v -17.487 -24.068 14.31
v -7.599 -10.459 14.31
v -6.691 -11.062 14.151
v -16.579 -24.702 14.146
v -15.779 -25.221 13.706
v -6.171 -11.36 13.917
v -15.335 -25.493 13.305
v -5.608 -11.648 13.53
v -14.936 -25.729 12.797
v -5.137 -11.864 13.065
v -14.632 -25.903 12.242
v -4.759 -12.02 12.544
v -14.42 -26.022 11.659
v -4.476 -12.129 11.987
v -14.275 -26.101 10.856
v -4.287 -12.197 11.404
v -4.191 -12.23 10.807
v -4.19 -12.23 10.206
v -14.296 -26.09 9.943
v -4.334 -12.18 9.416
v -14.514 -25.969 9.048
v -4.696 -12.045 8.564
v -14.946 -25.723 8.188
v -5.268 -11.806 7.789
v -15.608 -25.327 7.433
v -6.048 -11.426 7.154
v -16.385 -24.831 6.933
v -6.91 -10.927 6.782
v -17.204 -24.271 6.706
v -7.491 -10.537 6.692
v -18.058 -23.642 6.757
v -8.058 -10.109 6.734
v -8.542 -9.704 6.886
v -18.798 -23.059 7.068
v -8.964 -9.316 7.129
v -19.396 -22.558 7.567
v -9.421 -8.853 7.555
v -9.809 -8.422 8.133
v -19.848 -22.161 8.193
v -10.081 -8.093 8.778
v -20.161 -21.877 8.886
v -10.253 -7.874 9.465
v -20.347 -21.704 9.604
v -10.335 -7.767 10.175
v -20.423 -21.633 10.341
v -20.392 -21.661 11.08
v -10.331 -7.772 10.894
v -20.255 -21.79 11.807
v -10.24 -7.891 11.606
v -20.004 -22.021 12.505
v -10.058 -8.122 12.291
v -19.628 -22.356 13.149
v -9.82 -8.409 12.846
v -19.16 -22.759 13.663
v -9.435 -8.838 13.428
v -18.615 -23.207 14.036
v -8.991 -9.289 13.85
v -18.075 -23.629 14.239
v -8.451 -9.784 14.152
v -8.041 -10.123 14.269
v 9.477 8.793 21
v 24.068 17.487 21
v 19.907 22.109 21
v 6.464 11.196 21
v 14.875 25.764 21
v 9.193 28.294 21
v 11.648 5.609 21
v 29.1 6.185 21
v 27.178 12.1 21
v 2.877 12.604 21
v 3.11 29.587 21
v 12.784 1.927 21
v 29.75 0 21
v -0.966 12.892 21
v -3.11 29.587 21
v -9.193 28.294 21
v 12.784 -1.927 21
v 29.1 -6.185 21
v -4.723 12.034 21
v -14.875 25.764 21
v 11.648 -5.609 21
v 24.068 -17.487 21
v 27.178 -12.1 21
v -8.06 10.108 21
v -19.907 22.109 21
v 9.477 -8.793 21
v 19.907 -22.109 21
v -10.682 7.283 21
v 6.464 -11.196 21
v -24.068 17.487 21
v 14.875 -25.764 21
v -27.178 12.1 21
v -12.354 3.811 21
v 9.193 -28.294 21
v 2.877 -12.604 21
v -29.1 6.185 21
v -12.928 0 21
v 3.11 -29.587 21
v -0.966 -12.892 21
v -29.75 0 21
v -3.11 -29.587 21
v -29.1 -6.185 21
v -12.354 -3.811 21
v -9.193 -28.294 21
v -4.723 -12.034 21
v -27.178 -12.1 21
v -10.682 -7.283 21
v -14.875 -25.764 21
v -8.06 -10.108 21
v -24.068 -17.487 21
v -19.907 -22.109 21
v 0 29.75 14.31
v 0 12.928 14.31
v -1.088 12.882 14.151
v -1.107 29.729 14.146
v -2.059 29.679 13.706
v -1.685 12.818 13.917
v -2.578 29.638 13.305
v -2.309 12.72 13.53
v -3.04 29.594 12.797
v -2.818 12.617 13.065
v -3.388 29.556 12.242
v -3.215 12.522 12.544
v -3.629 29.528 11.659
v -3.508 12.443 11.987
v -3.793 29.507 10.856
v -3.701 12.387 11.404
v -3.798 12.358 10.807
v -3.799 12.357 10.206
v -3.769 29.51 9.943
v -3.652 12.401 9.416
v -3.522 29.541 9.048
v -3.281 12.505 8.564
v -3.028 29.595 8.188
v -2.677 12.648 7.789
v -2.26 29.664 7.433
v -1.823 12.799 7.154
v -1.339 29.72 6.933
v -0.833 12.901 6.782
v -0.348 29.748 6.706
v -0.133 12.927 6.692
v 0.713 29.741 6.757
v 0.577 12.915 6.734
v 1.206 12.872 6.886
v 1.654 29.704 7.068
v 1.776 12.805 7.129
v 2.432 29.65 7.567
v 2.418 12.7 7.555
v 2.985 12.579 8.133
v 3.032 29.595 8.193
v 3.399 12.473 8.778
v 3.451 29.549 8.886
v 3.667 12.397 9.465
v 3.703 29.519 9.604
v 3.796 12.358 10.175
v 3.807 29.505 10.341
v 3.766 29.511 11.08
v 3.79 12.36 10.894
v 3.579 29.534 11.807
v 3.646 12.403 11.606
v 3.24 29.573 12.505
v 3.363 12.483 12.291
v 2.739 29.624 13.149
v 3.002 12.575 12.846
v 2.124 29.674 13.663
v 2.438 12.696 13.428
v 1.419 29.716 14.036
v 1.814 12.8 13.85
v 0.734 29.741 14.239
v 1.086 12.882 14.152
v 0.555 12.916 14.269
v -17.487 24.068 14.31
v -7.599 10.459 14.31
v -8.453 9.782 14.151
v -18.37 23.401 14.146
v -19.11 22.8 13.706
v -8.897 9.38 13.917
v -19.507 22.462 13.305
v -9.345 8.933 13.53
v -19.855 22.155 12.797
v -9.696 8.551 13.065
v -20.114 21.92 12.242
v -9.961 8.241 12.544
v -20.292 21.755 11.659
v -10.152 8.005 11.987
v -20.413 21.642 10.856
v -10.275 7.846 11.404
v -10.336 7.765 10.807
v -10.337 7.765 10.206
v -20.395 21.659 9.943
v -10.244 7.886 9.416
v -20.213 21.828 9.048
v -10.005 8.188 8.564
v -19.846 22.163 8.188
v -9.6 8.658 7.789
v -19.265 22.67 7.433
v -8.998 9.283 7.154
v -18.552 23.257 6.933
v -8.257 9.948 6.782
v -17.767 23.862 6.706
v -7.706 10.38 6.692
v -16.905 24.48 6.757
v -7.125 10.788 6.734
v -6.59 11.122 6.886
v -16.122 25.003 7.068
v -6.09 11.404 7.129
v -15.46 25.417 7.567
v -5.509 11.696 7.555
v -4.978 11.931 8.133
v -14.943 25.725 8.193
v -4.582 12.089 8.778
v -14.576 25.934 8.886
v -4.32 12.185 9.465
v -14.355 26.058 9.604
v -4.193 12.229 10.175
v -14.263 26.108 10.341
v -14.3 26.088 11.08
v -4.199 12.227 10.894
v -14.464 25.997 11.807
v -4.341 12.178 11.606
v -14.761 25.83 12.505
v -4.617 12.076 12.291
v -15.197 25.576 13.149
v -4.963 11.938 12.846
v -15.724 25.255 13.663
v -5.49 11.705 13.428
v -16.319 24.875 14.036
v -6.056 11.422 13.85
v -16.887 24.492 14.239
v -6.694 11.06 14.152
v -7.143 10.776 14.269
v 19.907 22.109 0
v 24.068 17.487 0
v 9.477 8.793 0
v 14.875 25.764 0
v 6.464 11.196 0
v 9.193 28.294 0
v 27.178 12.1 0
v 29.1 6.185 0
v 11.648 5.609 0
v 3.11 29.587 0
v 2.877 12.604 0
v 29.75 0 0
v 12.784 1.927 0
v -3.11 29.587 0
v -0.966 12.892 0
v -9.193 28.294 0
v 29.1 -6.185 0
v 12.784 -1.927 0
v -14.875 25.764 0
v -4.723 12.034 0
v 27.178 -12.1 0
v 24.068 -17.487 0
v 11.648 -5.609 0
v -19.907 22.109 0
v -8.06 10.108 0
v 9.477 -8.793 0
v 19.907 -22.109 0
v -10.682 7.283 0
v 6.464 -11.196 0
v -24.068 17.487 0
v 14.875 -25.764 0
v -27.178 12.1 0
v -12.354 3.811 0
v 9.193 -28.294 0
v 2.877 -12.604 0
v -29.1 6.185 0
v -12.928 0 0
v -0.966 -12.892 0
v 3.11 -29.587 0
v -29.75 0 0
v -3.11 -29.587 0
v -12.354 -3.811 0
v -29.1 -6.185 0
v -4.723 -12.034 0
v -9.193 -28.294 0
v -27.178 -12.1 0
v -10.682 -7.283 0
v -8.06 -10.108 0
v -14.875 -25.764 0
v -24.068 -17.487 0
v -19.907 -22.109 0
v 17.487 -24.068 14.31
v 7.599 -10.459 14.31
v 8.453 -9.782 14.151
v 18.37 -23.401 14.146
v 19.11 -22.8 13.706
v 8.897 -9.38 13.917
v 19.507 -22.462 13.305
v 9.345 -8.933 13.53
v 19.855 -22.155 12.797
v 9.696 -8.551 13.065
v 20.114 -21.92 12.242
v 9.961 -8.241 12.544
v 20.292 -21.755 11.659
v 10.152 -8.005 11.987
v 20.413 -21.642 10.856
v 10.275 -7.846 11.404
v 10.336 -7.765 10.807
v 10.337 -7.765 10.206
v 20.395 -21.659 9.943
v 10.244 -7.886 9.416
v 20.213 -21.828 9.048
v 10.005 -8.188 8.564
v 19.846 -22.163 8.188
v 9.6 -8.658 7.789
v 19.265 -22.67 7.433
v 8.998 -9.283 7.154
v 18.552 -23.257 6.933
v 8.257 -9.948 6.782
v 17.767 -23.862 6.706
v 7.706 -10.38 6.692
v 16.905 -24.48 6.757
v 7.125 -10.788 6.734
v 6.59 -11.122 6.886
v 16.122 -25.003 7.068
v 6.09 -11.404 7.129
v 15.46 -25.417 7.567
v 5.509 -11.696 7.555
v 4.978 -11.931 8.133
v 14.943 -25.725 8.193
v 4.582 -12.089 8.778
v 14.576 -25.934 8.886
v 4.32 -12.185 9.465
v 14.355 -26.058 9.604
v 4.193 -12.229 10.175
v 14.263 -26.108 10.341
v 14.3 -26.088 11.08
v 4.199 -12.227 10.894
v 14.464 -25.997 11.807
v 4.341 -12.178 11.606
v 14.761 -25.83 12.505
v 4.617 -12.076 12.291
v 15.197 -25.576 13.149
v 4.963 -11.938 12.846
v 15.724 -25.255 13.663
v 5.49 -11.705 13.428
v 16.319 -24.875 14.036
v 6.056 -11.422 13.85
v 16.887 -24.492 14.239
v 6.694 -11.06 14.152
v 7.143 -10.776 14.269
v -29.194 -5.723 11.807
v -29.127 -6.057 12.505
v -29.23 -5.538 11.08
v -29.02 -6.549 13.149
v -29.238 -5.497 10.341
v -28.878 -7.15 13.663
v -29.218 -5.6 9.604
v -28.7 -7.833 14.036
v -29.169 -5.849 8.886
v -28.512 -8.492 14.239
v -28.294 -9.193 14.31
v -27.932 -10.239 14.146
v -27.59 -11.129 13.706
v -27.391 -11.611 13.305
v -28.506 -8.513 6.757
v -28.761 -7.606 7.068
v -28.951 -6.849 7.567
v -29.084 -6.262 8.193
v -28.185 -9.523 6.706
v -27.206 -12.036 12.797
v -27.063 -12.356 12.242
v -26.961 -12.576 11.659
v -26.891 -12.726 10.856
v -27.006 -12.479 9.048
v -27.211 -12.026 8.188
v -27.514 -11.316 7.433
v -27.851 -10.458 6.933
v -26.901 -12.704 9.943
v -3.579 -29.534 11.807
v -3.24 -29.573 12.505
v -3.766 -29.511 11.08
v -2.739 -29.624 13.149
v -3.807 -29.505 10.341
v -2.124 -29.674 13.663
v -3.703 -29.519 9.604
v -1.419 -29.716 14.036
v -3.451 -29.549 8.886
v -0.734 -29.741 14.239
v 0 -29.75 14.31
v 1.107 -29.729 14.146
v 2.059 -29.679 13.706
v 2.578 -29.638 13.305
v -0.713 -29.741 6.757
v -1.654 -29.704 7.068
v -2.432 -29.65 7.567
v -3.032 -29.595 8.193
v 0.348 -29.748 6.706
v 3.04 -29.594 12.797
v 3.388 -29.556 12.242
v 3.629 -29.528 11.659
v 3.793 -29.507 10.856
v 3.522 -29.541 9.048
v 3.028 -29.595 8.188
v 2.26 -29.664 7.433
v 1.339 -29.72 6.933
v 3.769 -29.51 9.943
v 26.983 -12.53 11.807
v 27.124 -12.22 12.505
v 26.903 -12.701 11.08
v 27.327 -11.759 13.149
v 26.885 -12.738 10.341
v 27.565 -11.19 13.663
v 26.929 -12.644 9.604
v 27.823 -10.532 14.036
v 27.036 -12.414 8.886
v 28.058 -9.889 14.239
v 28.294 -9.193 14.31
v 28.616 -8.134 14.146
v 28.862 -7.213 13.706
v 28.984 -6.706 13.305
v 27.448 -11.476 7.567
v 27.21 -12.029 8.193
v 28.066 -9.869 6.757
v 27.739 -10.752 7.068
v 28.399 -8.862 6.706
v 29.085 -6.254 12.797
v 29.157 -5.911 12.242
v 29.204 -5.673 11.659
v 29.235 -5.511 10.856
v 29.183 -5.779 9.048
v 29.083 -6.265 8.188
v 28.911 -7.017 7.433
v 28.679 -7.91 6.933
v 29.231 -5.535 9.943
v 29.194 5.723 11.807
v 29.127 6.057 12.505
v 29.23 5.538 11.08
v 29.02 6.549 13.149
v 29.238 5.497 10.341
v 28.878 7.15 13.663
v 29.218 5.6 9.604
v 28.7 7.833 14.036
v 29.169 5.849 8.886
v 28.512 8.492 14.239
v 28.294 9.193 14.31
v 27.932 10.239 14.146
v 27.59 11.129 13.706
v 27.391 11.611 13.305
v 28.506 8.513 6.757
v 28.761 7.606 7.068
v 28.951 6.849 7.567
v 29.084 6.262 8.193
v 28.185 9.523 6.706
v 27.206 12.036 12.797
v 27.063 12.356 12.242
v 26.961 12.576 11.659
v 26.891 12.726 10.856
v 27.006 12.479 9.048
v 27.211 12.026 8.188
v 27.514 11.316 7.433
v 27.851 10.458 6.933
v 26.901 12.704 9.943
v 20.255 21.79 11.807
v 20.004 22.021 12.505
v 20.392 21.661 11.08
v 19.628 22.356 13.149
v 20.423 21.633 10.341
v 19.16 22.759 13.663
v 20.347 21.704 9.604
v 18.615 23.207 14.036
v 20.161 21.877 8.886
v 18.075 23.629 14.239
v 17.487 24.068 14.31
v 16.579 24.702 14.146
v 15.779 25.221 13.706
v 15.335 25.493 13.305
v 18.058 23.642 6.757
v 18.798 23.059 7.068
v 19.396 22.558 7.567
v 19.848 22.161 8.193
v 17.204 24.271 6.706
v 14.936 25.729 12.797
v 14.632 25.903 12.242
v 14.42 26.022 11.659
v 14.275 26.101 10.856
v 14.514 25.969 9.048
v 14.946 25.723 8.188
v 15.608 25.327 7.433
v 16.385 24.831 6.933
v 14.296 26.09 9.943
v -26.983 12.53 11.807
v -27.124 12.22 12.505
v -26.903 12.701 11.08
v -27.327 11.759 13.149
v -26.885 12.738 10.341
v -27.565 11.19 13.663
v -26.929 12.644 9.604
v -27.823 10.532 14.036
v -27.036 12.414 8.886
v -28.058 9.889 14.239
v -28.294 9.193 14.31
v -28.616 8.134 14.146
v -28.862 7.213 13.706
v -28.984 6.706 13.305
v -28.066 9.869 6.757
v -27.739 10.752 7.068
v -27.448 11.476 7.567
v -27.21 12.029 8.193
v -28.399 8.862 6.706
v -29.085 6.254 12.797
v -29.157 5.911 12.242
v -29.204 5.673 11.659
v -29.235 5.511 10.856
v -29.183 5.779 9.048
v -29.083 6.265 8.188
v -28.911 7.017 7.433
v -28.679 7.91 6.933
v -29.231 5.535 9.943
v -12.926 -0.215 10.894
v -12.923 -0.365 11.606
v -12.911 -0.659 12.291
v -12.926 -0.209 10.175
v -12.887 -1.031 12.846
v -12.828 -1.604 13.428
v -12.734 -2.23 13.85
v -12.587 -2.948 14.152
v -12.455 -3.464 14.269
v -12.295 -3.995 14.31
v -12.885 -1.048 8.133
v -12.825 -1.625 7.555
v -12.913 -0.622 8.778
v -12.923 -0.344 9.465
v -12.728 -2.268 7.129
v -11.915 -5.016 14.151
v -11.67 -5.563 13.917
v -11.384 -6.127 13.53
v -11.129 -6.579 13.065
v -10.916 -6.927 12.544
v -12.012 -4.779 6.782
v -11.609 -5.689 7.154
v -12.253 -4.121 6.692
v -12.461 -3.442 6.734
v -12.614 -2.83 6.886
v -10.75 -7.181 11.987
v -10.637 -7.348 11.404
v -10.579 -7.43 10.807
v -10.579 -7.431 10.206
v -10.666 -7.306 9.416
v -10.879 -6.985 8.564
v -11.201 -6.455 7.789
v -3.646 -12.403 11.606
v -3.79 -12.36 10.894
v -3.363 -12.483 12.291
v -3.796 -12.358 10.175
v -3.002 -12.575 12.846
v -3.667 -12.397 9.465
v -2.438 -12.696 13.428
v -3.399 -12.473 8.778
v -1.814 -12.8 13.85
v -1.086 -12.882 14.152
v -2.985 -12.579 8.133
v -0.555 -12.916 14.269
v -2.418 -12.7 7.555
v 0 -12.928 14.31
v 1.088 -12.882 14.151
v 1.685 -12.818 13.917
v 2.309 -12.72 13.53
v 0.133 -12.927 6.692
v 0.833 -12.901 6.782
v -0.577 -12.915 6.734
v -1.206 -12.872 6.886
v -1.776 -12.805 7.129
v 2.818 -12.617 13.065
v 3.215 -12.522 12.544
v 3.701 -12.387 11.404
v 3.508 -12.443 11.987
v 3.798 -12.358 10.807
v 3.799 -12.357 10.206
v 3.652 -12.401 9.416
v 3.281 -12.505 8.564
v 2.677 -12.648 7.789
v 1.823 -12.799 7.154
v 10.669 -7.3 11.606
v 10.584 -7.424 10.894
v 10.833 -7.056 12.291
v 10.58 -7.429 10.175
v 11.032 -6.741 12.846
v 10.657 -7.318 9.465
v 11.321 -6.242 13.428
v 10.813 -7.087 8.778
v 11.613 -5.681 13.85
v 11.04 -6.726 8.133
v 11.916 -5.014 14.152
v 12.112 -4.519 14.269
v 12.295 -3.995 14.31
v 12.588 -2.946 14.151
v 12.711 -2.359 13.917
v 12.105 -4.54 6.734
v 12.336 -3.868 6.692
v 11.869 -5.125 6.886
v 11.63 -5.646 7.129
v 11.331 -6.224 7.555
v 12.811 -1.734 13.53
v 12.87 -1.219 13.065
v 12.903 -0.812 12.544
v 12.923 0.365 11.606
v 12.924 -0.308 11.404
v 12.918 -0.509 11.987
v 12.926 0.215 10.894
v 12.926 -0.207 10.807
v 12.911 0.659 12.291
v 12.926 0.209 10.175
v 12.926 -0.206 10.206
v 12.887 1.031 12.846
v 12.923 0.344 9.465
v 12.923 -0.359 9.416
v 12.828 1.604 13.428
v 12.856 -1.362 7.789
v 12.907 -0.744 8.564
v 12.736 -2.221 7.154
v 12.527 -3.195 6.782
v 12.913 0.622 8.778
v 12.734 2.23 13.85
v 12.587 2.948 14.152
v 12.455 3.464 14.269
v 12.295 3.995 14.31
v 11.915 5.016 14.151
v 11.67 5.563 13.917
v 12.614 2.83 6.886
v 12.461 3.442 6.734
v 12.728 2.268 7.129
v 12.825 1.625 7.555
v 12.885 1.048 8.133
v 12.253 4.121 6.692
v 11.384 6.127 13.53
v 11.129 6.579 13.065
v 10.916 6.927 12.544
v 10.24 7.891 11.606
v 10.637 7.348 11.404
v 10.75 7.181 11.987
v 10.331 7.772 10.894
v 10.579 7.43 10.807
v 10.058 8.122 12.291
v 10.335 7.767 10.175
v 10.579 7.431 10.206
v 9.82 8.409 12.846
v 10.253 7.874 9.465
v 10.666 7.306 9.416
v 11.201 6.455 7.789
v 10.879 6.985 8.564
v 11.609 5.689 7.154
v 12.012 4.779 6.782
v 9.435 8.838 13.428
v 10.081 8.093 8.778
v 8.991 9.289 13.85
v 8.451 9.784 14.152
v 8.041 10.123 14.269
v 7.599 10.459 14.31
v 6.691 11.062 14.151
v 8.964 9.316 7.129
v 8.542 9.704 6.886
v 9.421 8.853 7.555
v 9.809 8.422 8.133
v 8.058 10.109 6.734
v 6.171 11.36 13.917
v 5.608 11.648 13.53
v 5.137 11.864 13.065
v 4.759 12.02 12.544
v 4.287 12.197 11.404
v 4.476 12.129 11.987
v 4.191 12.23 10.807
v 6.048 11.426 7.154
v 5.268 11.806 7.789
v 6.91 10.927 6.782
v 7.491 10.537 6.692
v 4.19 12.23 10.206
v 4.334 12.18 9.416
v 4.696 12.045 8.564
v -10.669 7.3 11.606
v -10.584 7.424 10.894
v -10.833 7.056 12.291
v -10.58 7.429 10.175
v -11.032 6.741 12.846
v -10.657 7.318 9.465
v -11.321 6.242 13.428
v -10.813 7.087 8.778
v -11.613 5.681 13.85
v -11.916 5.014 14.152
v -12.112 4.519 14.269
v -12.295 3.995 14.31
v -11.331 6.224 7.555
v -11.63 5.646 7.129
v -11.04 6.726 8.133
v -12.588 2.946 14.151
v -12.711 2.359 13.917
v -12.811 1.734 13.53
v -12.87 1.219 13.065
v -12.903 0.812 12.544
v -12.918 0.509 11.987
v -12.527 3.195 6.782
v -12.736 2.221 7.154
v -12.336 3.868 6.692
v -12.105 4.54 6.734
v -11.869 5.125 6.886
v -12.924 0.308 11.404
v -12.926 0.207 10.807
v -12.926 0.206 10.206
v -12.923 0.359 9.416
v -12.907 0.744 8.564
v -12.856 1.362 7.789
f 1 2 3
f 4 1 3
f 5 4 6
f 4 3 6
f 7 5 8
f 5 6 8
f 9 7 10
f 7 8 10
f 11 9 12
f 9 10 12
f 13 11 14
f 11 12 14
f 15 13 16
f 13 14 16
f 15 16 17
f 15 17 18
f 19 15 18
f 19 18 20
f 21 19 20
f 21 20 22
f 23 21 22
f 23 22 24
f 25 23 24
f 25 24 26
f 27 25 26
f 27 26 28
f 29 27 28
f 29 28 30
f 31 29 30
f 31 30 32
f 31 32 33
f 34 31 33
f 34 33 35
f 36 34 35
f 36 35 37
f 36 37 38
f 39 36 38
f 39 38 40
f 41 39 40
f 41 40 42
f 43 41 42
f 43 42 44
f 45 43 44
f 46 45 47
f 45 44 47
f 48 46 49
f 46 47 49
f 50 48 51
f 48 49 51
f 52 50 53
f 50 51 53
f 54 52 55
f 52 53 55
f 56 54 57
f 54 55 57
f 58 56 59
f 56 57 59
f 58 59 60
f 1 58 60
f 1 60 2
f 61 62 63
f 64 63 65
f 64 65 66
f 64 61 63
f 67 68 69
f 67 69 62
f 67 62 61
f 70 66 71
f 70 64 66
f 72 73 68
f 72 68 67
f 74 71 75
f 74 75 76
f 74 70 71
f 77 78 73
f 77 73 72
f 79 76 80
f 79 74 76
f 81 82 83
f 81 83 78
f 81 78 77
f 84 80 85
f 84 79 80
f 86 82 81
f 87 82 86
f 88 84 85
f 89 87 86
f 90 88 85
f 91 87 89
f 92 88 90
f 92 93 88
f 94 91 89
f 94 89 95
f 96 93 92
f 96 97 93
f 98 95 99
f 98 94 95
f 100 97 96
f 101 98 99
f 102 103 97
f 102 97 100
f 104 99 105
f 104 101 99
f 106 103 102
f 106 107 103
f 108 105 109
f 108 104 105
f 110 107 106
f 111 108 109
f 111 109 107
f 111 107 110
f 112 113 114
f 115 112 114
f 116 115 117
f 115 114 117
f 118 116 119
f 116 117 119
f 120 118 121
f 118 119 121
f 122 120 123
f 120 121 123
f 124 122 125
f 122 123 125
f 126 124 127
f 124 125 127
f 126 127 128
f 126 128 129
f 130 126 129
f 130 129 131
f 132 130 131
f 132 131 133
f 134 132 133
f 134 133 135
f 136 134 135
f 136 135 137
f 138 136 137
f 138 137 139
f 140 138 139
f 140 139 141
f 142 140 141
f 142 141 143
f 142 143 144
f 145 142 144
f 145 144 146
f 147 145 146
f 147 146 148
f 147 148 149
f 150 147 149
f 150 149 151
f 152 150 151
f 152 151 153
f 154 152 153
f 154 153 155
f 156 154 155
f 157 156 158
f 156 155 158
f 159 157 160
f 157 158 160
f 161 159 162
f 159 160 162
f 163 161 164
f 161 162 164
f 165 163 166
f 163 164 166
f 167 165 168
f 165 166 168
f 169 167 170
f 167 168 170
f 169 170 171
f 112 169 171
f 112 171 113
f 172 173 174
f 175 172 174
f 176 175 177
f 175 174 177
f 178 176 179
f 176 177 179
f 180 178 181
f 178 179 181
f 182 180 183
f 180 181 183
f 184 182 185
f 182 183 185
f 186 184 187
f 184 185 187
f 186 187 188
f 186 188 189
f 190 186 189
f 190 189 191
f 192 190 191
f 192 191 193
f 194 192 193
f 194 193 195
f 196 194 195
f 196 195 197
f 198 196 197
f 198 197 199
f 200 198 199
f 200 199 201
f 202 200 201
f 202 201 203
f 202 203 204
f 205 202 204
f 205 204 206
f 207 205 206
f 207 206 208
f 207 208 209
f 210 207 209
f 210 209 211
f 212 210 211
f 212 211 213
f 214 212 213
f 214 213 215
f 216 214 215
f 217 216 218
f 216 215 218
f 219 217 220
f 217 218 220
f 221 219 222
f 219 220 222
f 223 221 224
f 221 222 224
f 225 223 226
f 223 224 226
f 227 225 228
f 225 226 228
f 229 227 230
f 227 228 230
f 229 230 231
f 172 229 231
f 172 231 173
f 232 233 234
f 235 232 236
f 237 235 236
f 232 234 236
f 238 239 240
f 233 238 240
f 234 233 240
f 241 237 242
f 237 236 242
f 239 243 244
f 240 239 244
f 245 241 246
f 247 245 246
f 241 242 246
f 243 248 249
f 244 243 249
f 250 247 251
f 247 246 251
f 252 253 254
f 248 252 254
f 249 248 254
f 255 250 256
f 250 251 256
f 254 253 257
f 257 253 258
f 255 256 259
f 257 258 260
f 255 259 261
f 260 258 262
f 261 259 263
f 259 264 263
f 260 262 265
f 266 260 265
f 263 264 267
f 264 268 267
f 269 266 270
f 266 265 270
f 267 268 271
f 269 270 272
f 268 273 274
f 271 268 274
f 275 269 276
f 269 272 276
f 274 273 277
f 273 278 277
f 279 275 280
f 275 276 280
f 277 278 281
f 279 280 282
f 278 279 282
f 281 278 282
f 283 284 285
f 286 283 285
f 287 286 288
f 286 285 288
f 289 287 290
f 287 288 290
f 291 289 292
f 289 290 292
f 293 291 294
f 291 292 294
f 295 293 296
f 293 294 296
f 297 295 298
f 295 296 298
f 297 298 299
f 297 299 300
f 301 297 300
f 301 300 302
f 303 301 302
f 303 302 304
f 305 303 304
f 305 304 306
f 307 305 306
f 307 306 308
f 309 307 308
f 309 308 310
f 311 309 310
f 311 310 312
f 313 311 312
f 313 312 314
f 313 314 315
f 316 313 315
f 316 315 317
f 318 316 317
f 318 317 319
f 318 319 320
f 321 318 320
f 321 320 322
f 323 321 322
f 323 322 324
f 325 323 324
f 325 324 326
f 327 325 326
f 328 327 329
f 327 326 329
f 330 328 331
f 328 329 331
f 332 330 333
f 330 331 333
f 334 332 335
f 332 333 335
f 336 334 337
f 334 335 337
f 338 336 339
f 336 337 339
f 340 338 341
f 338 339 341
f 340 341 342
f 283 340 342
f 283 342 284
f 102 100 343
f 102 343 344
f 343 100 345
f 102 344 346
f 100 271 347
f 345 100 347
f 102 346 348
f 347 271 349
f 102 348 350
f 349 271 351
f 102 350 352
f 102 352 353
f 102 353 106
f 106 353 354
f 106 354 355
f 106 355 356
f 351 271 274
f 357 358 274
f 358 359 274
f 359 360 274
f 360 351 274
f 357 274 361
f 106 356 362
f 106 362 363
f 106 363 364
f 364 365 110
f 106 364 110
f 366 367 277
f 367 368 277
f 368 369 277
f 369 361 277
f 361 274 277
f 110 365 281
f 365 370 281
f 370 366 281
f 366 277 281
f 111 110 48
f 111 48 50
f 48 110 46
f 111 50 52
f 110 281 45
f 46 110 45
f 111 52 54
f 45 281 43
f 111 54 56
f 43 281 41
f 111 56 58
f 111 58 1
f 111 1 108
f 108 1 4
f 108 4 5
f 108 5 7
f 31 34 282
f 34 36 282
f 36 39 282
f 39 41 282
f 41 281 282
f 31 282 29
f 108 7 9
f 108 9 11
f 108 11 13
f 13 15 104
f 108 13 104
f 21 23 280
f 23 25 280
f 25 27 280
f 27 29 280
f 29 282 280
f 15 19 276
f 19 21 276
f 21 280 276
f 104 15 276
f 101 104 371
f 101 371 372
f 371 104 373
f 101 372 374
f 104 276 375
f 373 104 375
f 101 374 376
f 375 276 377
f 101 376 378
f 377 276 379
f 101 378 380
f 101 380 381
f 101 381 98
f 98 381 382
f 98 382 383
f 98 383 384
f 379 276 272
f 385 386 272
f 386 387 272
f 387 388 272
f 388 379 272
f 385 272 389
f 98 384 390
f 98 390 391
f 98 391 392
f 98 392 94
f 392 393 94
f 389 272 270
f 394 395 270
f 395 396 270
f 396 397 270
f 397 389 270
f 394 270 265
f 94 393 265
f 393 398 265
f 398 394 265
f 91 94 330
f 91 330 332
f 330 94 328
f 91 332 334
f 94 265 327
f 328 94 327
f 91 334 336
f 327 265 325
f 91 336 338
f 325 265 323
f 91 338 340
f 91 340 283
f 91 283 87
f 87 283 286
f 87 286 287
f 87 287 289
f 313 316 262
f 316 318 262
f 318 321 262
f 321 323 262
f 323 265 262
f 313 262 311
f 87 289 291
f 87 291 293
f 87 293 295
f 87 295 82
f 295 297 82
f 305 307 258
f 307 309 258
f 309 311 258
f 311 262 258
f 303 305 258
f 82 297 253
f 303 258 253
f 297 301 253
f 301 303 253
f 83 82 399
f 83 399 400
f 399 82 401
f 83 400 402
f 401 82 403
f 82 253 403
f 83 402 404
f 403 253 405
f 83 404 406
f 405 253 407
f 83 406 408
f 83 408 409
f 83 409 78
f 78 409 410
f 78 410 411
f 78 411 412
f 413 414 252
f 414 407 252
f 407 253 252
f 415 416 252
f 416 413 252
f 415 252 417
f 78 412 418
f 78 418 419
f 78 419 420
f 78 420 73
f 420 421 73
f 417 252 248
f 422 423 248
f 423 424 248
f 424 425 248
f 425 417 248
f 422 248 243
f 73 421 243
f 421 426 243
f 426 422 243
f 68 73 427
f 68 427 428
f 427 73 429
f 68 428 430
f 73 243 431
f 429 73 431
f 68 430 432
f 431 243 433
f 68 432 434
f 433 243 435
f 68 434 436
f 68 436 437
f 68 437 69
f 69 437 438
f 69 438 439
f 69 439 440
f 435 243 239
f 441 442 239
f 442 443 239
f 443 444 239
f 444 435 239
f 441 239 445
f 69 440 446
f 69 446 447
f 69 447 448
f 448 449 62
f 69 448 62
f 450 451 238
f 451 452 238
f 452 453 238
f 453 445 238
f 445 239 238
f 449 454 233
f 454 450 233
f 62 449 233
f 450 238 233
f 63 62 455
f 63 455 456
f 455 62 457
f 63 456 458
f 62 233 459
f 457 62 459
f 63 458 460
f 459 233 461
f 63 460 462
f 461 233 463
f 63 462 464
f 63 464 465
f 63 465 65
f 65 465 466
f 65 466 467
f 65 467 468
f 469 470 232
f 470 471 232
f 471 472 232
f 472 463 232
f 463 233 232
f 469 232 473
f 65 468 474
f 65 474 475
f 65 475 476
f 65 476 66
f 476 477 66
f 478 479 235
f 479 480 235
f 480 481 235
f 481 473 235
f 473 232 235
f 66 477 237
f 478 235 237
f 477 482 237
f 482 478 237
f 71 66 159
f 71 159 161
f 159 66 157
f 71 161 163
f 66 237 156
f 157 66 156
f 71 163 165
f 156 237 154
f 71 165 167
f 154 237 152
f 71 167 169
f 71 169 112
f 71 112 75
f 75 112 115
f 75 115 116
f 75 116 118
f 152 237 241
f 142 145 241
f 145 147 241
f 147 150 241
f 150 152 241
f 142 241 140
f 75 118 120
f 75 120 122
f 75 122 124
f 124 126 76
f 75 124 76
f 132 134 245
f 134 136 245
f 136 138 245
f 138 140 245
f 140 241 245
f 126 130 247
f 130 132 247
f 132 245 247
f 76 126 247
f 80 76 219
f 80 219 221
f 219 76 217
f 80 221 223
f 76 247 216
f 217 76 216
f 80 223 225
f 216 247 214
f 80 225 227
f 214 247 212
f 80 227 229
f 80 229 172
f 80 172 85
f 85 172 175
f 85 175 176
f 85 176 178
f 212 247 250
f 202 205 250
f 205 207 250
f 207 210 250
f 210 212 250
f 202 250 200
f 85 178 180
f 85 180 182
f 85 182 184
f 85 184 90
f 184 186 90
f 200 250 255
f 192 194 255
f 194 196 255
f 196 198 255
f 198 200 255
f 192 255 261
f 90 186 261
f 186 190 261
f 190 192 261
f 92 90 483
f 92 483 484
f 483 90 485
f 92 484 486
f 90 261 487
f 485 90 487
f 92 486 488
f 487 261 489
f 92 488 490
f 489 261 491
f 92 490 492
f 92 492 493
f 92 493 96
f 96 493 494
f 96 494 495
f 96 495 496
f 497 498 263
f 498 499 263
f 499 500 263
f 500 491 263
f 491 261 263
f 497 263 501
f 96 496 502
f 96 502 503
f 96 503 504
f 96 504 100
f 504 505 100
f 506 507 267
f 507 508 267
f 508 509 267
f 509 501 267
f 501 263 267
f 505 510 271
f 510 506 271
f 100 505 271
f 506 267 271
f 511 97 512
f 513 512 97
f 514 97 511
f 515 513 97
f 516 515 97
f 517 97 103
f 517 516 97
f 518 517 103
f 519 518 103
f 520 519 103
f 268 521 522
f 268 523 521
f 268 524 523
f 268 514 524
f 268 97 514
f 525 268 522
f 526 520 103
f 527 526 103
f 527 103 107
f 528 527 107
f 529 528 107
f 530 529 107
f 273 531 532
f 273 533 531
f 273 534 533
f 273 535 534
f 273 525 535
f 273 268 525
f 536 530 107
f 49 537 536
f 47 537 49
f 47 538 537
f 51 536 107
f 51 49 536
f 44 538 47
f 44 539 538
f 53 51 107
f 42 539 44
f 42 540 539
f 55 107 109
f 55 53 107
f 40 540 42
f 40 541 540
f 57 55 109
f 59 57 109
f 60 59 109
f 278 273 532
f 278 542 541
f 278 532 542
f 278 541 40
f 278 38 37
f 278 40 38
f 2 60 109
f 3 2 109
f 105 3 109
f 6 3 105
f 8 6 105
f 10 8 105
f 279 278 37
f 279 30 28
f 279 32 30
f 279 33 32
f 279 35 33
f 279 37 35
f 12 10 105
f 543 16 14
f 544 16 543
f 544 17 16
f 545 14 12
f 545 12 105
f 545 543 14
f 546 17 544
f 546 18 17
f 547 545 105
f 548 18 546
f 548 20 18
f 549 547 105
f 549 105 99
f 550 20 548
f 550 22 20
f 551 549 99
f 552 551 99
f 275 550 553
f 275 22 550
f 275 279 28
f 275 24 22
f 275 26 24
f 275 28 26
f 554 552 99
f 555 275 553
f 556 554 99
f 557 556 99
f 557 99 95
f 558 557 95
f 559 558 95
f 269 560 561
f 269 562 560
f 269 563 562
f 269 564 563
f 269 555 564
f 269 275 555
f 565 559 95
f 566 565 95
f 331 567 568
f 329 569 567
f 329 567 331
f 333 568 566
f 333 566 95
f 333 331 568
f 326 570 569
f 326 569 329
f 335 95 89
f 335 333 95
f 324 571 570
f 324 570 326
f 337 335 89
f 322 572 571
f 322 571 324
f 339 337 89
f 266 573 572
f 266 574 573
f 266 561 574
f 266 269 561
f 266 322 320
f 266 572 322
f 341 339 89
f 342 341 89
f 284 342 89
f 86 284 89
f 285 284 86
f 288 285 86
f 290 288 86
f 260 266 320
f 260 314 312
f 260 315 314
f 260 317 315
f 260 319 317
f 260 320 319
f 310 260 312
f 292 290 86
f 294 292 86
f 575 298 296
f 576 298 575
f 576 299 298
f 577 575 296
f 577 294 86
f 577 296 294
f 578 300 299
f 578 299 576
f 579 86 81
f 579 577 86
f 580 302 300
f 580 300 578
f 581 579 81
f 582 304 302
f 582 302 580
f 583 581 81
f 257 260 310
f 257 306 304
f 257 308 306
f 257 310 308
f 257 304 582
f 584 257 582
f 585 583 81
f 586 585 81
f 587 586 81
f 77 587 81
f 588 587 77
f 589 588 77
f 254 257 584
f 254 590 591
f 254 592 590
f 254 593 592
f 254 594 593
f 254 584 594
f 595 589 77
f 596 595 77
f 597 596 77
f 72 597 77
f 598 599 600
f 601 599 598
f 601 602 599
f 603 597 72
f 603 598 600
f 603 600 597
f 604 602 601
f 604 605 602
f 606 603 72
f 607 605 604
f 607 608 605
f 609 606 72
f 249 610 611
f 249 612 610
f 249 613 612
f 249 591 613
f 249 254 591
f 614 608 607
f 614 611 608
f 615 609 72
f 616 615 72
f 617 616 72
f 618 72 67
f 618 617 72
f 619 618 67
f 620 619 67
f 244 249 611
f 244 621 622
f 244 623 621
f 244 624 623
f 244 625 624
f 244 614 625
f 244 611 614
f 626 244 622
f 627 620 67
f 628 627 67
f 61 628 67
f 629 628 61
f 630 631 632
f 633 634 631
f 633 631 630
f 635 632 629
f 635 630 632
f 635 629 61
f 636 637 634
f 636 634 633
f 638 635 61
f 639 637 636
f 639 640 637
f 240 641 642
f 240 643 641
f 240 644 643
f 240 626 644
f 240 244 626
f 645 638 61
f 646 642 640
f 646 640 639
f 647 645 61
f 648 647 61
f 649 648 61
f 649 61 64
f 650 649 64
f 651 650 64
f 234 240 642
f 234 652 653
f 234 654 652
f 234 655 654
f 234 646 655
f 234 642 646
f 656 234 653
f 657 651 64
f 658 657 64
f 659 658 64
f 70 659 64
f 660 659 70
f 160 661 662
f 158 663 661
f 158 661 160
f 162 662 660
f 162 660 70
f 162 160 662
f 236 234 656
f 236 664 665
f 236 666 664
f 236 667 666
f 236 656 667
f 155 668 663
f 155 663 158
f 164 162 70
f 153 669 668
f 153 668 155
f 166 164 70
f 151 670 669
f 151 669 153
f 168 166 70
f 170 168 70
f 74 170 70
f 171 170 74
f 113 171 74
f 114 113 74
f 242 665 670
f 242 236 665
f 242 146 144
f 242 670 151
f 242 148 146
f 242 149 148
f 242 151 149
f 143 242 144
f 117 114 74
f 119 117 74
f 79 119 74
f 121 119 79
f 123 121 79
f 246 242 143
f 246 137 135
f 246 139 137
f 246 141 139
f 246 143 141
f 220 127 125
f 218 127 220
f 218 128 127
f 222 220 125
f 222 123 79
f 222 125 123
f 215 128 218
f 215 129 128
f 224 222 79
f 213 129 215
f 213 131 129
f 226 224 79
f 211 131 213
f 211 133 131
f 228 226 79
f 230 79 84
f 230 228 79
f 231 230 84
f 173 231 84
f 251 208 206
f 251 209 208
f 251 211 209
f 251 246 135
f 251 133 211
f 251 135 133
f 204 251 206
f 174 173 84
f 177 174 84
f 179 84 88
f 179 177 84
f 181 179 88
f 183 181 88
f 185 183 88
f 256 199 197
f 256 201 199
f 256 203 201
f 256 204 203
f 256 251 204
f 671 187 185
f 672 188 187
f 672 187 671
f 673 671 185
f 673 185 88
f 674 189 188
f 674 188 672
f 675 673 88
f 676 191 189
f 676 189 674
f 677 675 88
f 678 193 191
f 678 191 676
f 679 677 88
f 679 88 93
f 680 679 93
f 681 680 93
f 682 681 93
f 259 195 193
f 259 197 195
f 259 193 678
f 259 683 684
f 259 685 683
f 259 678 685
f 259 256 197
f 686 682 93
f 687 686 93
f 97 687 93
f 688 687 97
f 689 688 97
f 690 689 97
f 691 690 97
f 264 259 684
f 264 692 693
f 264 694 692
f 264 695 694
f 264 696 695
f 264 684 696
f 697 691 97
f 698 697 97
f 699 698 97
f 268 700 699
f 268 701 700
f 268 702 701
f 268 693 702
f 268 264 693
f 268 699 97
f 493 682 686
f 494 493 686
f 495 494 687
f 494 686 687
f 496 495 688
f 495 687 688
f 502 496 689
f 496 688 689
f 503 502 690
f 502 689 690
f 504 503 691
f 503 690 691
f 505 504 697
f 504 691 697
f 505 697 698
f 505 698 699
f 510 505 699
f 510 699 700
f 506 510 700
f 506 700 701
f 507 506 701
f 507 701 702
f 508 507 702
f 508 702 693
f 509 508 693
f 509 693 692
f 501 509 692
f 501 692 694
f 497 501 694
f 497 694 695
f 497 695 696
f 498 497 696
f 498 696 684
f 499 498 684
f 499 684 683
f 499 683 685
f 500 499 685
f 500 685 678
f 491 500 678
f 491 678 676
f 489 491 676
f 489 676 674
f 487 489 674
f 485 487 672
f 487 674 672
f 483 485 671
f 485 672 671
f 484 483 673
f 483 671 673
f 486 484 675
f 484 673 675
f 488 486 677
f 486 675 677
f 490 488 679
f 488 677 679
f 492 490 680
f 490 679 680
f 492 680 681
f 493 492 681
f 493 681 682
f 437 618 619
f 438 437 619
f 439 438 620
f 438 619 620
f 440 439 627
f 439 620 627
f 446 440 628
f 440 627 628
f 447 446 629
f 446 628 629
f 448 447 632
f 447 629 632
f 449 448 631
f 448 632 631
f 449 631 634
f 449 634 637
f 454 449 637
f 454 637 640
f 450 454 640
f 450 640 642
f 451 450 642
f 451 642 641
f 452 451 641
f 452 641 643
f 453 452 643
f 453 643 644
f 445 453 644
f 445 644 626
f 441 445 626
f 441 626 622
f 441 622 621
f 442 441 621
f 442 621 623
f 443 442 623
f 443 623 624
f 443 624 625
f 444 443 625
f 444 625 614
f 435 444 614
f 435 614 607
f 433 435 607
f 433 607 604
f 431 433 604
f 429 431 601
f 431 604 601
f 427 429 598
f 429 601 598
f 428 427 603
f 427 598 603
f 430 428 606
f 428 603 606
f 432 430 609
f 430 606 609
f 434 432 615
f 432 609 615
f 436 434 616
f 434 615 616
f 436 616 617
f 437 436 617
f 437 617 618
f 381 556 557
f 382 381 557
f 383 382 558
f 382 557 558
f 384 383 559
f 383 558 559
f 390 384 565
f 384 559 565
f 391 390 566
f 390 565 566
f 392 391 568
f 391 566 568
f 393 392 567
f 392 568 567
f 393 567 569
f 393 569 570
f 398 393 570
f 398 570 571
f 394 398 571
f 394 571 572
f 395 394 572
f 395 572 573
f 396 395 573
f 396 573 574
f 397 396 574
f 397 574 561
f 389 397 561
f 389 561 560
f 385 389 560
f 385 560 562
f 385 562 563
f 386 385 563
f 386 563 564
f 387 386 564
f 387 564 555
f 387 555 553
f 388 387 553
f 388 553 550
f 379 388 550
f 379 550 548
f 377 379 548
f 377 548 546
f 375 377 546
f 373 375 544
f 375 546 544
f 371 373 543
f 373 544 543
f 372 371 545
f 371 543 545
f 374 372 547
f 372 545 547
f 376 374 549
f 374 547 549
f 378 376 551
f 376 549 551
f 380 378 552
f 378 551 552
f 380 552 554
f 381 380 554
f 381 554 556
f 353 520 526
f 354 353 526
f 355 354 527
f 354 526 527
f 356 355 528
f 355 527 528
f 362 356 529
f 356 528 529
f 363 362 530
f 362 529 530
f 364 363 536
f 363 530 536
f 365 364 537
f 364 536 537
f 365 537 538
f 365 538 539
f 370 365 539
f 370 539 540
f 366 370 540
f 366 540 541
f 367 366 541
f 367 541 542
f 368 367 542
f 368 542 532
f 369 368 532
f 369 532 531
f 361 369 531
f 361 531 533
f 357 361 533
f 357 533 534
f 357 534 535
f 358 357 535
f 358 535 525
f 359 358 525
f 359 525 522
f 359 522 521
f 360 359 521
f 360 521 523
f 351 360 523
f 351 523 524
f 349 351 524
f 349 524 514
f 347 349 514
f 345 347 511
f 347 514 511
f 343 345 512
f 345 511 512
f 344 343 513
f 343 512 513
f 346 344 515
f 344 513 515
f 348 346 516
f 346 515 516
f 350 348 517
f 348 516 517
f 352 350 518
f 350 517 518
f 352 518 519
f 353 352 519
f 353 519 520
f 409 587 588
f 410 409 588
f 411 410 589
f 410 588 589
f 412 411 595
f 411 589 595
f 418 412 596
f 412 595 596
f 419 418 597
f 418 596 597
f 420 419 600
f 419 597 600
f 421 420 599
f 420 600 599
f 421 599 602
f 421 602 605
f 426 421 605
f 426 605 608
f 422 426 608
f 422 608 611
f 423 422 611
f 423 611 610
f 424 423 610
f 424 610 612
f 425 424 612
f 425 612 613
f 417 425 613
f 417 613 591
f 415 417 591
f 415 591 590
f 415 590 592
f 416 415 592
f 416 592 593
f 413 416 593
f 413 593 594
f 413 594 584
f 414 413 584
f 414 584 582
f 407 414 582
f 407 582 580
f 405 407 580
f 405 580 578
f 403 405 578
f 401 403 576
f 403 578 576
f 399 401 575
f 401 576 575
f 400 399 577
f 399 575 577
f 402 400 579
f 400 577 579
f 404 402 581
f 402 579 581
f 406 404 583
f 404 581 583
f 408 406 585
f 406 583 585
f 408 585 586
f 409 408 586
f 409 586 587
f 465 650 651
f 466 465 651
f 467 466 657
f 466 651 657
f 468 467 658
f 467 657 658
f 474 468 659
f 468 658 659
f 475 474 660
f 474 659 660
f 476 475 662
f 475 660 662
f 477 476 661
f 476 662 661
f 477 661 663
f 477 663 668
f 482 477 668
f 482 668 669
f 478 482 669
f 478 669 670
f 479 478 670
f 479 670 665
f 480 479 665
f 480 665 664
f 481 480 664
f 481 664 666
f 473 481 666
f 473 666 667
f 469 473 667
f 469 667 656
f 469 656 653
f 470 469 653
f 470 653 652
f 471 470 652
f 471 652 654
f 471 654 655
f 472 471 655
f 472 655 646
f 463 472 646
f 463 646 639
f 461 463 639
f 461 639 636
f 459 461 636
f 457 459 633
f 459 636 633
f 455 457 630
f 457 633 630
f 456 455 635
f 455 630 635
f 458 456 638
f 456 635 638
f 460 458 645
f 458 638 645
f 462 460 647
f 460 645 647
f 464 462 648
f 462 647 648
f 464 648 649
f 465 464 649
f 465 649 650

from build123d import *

# Parameters (mm, degrees)
SKETCH1_R           = 29.75
SKETCH1_R_2         = 12.928028004
BOSS_EXTRUDE1_DEPTH = 21
SKETCH3_R           = 3.81
CUT_EXTRUDE1_DEPTH  = 31
CIRPATTERN1_COUNT   = 10


with BuildPart() as part:
    # Sketch1 → Boss-Extrude1 (new body)
    with BuildSketch(Plane.XY):
        with Locations(Location((0, 0, 0), (0, 0, 180))):
            Circle(SKETCH1_R)
        with Locations(Location((0, 0, 0), (0, 0, 180))):
            Circle(SKETCH1_R_2, mode=Mode.SUBTRACT)
    extrude(amount=BOSS_EXTRUDE1_DEPTH)

    # Sketch3 → Cut-Extrude1 (cut)
    with BuildSketch(Plane(origin=(0, 0, 0), x_dir=(1, 0, 0), z_dir=(0, 1, 0))):
        with Locations(Location((0, -10.5, 0), (0, 0, 270))):
            Circle(SKETCH3_R)
    cut_extrude1 = extrude(amount=-CUT_EXTRUDE1_DEPTH, mode=Mode.SUBTRACT)

    # CirPattern1: Cut-Extrude1 ×10 about axis
    cirpattern1_axis = Axis((0, 0, 21), (0, 0, -1))
    for i in range(1, CIRPATTERN1_COUNT):
        add(cut_extrude1.rotate(cirpattern1_axis, i * 360 / CIRPATTERN1_COUNT), mode=Mode.SUBTRACT)


solid = part.part
